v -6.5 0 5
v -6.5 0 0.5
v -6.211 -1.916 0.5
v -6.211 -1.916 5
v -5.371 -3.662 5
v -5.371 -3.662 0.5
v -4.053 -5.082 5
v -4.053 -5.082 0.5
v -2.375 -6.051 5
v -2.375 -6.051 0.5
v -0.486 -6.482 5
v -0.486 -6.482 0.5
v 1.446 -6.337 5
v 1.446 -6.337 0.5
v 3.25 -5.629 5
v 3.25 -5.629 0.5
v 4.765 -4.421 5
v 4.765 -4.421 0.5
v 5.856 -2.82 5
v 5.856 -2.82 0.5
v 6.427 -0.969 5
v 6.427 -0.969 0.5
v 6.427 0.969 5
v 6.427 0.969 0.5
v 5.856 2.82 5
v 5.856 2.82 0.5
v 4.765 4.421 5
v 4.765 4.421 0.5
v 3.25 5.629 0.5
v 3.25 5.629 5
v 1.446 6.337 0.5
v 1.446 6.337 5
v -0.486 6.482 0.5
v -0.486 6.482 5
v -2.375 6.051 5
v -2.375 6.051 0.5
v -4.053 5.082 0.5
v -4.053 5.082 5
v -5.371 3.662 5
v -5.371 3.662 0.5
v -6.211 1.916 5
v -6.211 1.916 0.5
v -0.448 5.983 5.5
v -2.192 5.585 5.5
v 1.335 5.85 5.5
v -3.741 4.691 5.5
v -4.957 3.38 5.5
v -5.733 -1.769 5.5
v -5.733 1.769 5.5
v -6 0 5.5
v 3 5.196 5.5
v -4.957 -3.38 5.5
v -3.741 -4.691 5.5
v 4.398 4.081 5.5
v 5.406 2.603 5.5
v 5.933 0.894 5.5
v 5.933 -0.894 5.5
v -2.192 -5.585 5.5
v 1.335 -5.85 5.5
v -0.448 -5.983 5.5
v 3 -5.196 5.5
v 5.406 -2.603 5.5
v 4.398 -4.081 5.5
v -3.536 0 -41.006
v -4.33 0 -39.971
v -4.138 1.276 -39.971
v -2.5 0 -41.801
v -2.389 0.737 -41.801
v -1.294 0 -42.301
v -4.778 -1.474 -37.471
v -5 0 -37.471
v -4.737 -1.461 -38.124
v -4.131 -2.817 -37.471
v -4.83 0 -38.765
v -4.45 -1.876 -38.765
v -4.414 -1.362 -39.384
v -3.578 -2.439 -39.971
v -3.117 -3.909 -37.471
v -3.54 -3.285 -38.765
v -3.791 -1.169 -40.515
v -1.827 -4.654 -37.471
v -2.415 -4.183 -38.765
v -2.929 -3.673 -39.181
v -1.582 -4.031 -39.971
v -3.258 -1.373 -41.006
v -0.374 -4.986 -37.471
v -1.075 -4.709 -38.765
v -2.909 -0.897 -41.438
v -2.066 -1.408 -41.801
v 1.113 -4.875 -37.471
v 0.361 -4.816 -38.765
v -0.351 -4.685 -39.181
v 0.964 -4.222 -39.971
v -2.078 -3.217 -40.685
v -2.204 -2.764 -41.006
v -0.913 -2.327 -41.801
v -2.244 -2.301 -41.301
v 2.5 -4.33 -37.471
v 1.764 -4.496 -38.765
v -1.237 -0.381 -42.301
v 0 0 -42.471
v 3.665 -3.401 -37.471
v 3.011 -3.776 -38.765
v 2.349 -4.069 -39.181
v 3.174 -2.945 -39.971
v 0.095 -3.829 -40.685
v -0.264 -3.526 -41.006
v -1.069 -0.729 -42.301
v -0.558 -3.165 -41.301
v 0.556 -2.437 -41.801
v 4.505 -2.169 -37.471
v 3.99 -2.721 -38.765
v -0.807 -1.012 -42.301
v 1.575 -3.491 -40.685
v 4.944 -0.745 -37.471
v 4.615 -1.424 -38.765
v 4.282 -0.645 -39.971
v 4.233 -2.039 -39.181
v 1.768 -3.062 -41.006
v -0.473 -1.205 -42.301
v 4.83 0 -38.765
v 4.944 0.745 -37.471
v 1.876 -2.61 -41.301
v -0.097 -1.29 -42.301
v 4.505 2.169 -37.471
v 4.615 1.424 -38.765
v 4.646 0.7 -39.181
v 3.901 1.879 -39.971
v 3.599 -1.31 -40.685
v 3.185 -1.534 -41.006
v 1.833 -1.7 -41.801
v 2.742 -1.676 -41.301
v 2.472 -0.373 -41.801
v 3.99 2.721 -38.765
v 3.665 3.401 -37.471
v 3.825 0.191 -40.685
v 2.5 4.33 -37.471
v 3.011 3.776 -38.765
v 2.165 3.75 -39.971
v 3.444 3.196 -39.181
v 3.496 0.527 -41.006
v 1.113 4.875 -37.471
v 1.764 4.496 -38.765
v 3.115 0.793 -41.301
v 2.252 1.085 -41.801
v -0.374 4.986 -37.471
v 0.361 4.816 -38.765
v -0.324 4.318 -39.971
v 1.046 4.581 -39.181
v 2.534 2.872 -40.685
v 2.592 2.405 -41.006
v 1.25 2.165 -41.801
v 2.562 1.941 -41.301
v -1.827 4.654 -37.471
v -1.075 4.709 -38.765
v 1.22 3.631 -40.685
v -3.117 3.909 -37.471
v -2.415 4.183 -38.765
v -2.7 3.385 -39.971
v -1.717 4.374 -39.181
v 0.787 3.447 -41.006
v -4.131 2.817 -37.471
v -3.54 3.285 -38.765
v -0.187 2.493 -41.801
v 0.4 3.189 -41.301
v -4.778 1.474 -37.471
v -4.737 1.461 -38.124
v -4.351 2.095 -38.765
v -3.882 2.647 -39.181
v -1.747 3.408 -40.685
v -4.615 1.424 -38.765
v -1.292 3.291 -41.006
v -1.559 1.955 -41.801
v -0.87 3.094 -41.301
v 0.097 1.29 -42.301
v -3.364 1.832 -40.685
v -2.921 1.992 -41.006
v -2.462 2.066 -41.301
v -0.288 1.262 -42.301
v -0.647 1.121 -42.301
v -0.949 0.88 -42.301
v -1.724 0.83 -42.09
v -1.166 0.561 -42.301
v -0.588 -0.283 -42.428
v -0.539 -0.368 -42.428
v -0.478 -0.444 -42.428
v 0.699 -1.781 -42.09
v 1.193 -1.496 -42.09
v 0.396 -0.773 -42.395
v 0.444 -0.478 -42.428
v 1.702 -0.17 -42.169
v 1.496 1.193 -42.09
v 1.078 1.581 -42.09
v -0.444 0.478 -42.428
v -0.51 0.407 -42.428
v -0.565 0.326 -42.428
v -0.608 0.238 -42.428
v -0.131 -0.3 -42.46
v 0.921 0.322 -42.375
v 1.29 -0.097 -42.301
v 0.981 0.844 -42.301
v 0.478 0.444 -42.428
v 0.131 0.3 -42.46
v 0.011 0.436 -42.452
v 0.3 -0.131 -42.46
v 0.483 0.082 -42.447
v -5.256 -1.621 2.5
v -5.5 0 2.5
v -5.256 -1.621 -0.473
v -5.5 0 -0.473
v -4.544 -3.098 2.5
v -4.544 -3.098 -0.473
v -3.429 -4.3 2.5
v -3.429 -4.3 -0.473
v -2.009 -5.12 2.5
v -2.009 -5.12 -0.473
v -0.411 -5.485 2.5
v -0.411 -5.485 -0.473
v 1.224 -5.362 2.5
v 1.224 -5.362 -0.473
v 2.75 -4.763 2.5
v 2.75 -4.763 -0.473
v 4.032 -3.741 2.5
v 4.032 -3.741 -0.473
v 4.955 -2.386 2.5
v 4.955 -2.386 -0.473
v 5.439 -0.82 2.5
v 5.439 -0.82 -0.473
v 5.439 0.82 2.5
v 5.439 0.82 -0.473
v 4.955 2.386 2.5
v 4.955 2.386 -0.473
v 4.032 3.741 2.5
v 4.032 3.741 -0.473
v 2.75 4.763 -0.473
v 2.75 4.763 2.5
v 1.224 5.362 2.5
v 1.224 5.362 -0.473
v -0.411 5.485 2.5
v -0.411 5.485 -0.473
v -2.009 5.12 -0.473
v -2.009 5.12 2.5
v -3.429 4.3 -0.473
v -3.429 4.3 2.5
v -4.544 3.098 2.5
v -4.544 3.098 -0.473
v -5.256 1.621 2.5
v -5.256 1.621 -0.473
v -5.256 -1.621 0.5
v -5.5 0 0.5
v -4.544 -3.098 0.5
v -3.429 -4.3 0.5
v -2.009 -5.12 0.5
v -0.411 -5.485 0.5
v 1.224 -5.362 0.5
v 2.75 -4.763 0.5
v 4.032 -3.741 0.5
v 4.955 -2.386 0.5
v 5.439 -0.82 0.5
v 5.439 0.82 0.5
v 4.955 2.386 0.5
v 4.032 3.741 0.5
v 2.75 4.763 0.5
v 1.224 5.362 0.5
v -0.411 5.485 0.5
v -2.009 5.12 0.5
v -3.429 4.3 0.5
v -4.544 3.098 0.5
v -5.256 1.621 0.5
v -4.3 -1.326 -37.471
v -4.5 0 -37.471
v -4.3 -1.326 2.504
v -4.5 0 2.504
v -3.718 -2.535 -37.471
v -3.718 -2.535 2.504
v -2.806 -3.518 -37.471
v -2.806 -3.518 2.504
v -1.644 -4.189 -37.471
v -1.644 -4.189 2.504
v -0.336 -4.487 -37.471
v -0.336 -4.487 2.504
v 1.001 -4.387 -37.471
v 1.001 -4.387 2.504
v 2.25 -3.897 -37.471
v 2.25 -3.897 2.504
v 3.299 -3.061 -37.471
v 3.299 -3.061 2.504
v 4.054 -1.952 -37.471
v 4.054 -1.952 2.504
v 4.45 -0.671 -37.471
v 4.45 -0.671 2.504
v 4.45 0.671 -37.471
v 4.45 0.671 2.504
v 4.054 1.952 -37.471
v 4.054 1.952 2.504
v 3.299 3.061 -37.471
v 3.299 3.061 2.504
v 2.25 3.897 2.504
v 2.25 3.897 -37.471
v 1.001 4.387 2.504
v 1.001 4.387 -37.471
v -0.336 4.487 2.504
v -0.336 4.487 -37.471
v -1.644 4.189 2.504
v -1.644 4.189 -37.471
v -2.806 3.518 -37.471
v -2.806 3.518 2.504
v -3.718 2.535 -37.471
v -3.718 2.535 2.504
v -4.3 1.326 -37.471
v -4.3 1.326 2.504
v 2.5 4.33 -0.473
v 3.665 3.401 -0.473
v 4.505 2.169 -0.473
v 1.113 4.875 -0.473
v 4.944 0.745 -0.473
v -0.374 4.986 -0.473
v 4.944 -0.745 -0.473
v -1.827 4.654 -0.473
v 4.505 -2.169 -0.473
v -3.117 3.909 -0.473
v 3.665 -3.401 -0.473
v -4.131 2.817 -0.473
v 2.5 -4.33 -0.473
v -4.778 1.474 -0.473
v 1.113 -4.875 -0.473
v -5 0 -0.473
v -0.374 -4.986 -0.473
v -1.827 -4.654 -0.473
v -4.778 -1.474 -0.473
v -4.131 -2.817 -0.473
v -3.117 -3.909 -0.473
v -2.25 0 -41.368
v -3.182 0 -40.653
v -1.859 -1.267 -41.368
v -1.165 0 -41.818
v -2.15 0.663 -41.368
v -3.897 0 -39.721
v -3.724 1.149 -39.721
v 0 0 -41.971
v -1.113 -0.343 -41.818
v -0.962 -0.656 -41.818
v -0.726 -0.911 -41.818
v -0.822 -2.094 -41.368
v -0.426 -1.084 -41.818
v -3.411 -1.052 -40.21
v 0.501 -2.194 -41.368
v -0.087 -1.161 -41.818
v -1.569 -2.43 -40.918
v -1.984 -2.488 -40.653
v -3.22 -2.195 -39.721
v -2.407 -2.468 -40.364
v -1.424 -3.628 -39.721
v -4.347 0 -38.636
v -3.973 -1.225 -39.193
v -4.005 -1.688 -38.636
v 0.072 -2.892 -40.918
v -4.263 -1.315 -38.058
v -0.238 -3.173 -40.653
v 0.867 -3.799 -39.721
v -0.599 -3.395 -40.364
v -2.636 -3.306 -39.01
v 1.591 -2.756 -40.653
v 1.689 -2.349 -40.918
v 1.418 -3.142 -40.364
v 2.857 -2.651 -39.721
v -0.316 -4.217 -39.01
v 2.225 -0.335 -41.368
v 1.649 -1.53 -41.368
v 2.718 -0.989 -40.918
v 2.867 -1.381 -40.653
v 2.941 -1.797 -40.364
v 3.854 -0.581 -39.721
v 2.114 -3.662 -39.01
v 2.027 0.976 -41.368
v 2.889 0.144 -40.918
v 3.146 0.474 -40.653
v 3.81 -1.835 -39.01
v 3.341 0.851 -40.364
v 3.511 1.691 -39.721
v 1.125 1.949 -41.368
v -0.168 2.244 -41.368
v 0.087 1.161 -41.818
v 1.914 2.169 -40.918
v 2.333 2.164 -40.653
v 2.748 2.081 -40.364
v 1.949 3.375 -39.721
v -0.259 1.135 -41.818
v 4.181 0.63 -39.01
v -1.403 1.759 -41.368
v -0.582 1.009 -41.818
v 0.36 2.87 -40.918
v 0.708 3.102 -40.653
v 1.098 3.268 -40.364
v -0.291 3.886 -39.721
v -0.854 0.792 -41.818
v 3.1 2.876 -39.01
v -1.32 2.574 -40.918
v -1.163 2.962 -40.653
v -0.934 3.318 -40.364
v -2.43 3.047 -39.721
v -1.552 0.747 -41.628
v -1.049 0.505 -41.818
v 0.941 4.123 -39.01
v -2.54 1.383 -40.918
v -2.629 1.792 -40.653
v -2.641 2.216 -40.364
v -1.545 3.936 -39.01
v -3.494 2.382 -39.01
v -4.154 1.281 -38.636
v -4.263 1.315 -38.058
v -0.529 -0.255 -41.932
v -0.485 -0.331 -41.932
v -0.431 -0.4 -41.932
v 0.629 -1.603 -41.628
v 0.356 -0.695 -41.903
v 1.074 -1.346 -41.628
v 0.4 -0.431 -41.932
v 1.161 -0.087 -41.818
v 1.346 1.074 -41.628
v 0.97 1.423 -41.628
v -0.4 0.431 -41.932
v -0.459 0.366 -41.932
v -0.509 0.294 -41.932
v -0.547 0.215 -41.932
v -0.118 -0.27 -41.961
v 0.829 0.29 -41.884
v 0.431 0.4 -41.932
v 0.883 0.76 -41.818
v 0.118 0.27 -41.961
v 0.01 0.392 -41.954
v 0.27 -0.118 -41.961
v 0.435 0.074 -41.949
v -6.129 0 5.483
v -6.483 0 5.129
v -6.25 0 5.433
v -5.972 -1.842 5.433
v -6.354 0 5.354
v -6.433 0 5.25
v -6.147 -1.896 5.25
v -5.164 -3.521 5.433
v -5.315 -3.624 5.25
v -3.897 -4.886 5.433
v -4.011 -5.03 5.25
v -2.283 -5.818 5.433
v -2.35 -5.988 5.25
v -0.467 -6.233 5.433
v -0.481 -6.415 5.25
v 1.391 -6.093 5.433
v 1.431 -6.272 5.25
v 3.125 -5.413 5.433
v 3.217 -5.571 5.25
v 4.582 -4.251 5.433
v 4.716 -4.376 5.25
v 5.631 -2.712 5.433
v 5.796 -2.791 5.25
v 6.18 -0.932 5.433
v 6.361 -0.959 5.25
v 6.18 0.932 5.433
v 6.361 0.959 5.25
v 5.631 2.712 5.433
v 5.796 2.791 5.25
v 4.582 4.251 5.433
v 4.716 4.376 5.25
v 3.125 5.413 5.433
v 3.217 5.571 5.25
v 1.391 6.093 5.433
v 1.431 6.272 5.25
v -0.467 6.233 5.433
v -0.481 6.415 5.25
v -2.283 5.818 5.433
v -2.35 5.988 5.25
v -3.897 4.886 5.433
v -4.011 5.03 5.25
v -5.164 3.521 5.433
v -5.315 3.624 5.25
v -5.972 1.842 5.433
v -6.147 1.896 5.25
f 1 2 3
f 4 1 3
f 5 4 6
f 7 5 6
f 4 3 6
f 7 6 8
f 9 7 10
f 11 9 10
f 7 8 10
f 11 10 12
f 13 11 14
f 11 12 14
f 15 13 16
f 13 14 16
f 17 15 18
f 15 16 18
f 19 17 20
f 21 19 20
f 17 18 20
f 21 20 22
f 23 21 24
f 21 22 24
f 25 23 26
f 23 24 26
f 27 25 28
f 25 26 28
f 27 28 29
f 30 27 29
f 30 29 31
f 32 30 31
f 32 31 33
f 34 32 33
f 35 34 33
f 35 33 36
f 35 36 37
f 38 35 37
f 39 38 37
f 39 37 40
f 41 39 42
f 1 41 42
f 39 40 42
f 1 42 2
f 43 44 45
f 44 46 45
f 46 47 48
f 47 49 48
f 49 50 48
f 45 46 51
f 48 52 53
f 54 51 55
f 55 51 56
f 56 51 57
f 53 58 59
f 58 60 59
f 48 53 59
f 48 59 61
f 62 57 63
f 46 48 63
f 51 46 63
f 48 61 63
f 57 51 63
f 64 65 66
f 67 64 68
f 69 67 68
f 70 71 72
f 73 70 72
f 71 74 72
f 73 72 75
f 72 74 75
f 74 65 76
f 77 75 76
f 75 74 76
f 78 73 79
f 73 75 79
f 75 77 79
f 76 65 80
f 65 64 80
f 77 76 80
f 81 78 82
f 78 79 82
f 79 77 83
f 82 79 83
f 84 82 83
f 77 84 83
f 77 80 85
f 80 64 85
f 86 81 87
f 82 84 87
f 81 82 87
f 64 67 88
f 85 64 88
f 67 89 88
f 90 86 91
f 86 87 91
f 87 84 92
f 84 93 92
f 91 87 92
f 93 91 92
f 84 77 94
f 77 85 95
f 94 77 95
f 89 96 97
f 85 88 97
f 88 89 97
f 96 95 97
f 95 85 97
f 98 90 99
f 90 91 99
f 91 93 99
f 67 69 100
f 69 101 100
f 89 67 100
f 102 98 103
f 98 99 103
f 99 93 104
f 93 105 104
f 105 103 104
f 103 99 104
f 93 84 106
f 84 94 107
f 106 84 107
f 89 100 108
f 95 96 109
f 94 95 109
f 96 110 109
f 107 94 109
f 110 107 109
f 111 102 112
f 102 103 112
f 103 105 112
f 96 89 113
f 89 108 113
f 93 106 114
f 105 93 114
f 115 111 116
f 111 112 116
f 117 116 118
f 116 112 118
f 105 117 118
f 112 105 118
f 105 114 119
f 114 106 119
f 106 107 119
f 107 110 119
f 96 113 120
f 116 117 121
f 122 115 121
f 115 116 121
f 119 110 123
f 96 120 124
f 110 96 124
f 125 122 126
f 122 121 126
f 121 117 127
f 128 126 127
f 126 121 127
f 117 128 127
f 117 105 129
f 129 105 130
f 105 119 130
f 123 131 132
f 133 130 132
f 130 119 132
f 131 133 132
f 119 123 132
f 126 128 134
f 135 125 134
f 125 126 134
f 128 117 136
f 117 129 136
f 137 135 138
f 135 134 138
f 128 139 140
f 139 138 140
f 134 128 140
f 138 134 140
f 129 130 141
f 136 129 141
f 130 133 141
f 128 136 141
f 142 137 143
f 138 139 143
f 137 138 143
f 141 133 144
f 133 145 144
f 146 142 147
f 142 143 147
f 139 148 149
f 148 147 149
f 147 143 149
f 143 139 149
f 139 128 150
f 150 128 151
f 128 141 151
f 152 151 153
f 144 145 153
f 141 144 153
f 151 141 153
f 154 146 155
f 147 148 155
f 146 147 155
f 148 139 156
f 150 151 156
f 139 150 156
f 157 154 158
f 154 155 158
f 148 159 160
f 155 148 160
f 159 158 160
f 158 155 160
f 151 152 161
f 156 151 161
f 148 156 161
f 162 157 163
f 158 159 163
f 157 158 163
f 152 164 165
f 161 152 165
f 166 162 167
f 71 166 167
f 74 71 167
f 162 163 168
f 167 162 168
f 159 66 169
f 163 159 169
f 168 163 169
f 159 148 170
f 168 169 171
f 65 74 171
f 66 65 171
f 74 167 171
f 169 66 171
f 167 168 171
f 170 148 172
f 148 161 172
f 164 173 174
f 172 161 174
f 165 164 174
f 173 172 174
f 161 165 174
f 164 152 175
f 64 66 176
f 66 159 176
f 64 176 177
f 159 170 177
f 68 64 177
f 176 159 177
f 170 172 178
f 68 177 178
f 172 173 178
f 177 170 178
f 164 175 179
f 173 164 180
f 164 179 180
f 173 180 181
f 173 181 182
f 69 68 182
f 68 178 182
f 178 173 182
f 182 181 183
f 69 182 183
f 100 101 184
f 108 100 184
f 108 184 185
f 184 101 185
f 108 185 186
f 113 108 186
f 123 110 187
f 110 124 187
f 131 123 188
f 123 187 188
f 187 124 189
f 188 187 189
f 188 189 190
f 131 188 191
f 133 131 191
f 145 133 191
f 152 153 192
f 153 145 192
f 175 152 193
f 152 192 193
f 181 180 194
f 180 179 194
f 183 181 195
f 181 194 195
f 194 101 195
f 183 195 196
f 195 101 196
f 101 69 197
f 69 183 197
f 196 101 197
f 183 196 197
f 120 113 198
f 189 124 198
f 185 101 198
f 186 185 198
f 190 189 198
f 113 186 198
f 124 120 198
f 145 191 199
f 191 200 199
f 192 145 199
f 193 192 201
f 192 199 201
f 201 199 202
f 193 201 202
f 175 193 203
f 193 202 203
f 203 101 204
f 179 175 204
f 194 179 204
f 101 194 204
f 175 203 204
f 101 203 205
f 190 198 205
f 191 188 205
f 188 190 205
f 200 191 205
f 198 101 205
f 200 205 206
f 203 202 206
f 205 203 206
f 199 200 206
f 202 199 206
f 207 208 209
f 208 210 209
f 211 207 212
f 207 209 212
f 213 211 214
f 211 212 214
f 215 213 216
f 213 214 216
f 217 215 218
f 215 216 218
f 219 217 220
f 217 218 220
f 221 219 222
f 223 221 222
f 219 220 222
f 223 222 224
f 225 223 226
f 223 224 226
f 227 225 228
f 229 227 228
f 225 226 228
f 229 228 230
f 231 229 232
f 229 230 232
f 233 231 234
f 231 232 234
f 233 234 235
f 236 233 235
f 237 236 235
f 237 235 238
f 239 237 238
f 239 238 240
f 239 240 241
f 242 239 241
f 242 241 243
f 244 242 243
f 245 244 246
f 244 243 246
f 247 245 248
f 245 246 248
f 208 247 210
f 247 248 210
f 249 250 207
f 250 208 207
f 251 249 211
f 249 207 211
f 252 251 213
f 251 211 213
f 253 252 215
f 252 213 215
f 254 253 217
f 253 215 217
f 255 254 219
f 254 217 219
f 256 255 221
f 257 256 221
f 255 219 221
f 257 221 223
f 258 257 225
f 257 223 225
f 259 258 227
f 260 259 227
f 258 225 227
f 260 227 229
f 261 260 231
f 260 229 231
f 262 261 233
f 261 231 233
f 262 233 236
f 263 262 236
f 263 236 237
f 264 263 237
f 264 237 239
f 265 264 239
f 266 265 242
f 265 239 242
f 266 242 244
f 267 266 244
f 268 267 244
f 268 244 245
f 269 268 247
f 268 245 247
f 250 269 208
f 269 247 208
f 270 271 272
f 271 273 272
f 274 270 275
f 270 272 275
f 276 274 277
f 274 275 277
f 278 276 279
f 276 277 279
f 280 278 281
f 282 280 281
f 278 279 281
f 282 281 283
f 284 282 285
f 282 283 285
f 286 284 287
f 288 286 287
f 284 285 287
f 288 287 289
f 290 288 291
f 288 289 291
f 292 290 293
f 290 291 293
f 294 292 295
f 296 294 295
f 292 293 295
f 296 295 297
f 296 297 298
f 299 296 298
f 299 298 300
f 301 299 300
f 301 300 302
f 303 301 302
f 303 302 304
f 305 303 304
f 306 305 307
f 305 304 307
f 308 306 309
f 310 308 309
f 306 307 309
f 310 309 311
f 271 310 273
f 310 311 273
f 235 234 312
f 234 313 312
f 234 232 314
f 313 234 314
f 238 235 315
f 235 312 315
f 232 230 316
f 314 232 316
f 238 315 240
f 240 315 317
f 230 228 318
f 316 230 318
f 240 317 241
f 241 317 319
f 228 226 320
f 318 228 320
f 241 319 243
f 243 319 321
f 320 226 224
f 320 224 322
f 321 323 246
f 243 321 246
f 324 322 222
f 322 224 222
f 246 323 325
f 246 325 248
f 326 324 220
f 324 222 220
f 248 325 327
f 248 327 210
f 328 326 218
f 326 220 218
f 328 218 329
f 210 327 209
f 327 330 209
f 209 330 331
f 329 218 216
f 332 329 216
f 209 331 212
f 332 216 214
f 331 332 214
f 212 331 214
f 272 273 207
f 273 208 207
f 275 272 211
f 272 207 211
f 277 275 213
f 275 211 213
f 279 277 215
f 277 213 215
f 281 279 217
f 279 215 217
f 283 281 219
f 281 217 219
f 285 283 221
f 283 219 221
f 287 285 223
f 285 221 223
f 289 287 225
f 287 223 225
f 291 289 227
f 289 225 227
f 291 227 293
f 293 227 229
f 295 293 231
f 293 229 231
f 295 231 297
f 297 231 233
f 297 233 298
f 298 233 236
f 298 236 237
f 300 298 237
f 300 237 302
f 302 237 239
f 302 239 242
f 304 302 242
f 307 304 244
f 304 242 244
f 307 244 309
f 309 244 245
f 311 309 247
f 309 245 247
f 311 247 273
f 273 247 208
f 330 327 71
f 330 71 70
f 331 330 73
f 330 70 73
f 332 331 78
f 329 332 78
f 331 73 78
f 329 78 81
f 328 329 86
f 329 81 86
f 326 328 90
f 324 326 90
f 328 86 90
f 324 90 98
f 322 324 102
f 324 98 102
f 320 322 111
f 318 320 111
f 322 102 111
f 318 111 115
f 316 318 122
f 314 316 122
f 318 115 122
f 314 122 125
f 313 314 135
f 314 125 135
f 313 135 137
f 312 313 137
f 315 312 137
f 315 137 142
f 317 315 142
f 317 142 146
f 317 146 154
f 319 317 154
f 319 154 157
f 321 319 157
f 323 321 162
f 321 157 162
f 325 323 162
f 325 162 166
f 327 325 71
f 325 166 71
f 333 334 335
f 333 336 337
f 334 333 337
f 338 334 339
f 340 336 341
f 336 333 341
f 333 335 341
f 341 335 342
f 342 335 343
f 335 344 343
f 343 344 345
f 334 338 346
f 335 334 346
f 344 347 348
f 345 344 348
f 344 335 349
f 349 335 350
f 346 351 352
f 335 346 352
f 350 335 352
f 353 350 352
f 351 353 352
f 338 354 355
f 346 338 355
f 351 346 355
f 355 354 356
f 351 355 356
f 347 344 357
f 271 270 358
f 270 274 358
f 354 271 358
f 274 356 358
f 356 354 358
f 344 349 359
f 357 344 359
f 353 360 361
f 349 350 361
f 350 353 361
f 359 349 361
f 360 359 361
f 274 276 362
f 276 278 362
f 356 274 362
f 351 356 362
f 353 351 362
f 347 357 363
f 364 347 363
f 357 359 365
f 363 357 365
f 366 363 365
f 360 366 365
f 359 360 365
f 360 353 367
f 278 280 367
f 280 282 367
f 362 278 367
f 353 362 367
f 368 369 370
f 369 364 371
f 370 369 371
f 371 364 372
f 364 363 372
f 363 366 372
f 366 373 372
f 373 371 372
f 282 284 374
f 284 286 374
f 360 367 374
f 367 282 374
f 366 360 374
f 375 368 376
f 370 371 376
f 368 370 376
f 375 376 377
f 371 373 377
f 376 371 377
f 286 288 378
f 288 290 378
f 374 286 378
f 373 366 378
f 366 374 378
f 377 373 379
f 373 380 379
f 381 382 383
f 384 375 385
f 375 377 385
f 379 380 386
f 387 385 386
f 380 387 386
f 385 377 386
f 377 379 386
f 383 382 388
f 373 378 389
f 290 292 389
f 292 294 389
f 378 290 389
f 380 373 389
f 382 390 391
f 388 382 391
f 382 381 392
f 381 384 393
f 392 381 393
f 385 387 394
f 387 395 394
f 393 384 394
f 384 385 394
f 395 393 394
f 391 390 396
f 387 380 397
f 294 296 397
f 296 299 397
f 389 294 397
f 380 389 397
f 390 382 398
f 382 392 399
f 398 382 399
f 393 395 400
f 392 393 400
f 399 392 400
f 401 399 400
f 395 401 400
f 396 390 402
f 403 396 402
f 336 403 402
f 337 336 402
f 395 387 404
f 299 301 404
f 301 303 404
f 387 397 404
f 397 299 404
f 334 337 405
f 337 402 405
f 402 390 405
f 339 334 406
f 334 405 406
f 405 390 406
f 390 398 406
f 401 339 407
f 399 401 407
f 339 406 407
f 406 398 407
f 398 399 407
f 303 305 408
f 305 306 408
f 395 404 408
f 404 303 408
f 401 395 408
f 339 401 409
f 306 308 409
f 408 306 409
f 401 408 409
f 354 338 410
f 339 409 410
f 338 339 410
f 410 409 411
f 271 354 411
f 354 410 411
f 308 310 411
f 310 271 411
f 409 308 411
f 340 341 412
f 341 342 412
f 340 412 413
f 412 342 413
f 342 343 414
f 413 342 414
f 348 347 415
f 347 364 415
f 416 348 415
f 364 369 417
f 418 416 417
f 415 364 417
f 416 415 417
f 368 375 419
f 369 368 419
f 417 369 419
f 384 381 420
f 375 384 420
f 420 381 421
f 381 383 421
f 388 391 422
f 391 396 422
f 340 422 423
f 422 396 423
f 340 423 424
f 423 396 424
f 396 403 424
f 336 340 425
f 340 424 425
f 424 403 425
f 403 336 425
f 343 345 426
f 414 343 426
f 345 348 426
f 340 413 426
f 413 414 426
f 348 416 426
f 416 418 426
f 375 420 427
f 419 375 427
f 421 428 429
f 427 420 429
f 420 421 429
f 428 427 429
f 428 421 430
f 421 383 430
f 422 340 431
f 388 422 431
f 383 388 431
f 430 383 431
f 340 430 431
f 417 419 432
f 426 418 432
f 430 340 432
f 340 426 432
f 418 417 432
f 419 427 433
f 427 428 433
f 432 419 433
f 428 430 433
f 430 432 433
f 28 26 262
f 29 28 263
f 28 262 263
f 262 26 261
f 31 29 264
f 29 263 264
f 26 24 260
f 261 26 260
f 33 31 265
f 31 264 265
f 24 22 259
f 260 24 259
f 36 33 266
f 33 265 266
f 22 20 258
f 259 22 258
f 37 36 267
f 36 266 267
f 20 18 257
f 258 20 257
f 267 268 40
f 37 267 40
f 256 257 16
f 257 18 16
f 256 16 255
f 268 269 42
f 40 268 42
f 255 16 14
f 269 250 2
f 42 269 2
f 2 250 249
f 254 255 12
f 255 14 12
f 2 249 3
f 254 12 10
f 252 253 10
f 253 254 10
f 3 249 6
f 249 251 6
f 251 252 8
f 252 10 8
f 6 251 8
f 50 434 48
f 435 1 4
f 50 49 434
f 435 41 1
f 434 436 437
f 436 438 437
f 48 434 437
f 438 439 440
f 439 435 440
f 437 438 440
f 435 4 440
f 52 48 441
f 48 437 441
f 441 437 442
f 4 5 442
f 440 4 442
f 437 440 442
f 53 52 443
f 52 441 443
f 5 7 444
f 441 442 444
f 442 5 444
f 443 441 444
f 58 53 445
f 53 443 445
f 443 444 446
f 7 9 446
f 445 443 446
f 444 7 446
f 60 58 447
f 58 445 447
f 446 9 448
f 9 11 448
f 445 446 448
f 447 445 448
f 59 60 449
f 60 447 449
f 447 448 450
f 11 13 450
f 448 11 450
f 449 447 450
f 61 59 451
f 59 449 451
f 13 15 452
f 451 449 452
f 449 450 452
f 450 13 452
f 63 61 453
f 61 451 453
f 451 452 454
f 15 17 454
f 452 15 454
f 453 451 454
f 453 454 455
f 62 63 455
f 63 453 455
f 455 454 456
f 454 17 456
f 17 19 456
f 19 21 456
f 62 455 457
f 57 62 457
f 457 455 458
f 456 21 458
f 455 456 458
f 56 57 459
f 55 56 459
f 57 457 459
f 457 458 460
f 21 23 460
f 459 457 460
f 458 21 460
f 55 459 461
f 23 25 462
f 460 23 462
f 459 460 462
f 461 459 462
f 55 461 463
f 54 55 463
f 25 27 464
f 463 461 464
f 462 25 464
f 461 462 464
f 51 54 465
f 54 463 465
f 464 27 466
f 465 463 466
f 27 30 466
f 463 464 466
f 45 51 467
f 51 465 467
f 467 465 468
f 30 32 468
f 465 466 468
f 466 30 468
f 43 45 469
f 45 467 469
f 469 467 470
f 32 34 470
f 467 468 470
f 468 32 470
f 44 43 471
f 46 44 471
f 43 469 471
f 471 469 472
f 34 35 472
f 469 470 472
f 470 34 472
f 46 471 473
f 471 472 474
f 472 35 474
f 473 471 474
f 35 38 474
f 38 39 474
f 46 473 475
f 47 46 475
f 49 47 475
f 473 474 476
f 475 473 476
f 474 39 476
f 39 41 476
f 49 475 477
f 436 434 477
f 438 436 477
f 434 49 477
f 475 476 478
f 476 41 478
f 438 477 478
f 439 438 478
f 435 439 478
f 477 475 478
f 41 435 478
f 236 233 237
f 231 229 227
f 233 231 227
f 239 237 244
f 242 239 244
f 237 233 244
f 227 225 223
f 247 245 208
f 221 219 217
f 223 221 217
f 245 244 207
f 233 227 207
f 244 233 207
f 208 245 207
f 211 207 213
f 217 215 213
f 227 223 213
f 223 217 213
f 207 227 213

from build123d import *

# Parameters (mm, degrees)
F4_R = 0.5


with BuildPart() as f1:
    # F0 (on Front) → F1 (revolve)
    with BuildSketch(Plane.XZ):
        with BuildLine():
            Line((-5.5, -0.472584), (-5, -0.472584))
            Line((-5, -0.472584), (-5, -37.470958))
            ThreePointArc((-5, -37.470958), (-3.535534, -41.006492), (0, -42.470958))
            Line((0, -42.470958), (0, -41.970958))
            ThreePointArc((0, -41.970958), (-3.181981, -40.652939), (-4.5, -37.470958))
            Line((-4.5, -37.470958), (-4.5, 2.504139))
            Line((-4.5, 2.504139), (-5.5, 2.5))
            Line((-5.5, 2.5), (-5.5, 0))
            Line((-5.5, 0), (-5.5, -0.472584))
        make_face()
    revolve(axis=Axis((0, 0, -13.258269), (0, 0, 1)))


with BuildPart() as f3:
    # F2 (on Front) → F3 (revolve)
    with BuildSketch(Plane.XZ):
        Polygon((0, 2.5), (0, 5.5), (-6.5, 5.5), (-6.5, 0.5), (-5.5, 0.5), (-5.5, 2.5), align=None)
    revolve(axis=Axis((0, 0, 2.100606), (0, 0, 1)))

    # F4
    f4_edges = [f3.edges().sort_by_distance(p)[0] for p in [
        (6.5, 0, 5.5),
    ]]
    fillet(f4_edges, radius=F4_R)


solid = Compound([f1.part, f3.part])
